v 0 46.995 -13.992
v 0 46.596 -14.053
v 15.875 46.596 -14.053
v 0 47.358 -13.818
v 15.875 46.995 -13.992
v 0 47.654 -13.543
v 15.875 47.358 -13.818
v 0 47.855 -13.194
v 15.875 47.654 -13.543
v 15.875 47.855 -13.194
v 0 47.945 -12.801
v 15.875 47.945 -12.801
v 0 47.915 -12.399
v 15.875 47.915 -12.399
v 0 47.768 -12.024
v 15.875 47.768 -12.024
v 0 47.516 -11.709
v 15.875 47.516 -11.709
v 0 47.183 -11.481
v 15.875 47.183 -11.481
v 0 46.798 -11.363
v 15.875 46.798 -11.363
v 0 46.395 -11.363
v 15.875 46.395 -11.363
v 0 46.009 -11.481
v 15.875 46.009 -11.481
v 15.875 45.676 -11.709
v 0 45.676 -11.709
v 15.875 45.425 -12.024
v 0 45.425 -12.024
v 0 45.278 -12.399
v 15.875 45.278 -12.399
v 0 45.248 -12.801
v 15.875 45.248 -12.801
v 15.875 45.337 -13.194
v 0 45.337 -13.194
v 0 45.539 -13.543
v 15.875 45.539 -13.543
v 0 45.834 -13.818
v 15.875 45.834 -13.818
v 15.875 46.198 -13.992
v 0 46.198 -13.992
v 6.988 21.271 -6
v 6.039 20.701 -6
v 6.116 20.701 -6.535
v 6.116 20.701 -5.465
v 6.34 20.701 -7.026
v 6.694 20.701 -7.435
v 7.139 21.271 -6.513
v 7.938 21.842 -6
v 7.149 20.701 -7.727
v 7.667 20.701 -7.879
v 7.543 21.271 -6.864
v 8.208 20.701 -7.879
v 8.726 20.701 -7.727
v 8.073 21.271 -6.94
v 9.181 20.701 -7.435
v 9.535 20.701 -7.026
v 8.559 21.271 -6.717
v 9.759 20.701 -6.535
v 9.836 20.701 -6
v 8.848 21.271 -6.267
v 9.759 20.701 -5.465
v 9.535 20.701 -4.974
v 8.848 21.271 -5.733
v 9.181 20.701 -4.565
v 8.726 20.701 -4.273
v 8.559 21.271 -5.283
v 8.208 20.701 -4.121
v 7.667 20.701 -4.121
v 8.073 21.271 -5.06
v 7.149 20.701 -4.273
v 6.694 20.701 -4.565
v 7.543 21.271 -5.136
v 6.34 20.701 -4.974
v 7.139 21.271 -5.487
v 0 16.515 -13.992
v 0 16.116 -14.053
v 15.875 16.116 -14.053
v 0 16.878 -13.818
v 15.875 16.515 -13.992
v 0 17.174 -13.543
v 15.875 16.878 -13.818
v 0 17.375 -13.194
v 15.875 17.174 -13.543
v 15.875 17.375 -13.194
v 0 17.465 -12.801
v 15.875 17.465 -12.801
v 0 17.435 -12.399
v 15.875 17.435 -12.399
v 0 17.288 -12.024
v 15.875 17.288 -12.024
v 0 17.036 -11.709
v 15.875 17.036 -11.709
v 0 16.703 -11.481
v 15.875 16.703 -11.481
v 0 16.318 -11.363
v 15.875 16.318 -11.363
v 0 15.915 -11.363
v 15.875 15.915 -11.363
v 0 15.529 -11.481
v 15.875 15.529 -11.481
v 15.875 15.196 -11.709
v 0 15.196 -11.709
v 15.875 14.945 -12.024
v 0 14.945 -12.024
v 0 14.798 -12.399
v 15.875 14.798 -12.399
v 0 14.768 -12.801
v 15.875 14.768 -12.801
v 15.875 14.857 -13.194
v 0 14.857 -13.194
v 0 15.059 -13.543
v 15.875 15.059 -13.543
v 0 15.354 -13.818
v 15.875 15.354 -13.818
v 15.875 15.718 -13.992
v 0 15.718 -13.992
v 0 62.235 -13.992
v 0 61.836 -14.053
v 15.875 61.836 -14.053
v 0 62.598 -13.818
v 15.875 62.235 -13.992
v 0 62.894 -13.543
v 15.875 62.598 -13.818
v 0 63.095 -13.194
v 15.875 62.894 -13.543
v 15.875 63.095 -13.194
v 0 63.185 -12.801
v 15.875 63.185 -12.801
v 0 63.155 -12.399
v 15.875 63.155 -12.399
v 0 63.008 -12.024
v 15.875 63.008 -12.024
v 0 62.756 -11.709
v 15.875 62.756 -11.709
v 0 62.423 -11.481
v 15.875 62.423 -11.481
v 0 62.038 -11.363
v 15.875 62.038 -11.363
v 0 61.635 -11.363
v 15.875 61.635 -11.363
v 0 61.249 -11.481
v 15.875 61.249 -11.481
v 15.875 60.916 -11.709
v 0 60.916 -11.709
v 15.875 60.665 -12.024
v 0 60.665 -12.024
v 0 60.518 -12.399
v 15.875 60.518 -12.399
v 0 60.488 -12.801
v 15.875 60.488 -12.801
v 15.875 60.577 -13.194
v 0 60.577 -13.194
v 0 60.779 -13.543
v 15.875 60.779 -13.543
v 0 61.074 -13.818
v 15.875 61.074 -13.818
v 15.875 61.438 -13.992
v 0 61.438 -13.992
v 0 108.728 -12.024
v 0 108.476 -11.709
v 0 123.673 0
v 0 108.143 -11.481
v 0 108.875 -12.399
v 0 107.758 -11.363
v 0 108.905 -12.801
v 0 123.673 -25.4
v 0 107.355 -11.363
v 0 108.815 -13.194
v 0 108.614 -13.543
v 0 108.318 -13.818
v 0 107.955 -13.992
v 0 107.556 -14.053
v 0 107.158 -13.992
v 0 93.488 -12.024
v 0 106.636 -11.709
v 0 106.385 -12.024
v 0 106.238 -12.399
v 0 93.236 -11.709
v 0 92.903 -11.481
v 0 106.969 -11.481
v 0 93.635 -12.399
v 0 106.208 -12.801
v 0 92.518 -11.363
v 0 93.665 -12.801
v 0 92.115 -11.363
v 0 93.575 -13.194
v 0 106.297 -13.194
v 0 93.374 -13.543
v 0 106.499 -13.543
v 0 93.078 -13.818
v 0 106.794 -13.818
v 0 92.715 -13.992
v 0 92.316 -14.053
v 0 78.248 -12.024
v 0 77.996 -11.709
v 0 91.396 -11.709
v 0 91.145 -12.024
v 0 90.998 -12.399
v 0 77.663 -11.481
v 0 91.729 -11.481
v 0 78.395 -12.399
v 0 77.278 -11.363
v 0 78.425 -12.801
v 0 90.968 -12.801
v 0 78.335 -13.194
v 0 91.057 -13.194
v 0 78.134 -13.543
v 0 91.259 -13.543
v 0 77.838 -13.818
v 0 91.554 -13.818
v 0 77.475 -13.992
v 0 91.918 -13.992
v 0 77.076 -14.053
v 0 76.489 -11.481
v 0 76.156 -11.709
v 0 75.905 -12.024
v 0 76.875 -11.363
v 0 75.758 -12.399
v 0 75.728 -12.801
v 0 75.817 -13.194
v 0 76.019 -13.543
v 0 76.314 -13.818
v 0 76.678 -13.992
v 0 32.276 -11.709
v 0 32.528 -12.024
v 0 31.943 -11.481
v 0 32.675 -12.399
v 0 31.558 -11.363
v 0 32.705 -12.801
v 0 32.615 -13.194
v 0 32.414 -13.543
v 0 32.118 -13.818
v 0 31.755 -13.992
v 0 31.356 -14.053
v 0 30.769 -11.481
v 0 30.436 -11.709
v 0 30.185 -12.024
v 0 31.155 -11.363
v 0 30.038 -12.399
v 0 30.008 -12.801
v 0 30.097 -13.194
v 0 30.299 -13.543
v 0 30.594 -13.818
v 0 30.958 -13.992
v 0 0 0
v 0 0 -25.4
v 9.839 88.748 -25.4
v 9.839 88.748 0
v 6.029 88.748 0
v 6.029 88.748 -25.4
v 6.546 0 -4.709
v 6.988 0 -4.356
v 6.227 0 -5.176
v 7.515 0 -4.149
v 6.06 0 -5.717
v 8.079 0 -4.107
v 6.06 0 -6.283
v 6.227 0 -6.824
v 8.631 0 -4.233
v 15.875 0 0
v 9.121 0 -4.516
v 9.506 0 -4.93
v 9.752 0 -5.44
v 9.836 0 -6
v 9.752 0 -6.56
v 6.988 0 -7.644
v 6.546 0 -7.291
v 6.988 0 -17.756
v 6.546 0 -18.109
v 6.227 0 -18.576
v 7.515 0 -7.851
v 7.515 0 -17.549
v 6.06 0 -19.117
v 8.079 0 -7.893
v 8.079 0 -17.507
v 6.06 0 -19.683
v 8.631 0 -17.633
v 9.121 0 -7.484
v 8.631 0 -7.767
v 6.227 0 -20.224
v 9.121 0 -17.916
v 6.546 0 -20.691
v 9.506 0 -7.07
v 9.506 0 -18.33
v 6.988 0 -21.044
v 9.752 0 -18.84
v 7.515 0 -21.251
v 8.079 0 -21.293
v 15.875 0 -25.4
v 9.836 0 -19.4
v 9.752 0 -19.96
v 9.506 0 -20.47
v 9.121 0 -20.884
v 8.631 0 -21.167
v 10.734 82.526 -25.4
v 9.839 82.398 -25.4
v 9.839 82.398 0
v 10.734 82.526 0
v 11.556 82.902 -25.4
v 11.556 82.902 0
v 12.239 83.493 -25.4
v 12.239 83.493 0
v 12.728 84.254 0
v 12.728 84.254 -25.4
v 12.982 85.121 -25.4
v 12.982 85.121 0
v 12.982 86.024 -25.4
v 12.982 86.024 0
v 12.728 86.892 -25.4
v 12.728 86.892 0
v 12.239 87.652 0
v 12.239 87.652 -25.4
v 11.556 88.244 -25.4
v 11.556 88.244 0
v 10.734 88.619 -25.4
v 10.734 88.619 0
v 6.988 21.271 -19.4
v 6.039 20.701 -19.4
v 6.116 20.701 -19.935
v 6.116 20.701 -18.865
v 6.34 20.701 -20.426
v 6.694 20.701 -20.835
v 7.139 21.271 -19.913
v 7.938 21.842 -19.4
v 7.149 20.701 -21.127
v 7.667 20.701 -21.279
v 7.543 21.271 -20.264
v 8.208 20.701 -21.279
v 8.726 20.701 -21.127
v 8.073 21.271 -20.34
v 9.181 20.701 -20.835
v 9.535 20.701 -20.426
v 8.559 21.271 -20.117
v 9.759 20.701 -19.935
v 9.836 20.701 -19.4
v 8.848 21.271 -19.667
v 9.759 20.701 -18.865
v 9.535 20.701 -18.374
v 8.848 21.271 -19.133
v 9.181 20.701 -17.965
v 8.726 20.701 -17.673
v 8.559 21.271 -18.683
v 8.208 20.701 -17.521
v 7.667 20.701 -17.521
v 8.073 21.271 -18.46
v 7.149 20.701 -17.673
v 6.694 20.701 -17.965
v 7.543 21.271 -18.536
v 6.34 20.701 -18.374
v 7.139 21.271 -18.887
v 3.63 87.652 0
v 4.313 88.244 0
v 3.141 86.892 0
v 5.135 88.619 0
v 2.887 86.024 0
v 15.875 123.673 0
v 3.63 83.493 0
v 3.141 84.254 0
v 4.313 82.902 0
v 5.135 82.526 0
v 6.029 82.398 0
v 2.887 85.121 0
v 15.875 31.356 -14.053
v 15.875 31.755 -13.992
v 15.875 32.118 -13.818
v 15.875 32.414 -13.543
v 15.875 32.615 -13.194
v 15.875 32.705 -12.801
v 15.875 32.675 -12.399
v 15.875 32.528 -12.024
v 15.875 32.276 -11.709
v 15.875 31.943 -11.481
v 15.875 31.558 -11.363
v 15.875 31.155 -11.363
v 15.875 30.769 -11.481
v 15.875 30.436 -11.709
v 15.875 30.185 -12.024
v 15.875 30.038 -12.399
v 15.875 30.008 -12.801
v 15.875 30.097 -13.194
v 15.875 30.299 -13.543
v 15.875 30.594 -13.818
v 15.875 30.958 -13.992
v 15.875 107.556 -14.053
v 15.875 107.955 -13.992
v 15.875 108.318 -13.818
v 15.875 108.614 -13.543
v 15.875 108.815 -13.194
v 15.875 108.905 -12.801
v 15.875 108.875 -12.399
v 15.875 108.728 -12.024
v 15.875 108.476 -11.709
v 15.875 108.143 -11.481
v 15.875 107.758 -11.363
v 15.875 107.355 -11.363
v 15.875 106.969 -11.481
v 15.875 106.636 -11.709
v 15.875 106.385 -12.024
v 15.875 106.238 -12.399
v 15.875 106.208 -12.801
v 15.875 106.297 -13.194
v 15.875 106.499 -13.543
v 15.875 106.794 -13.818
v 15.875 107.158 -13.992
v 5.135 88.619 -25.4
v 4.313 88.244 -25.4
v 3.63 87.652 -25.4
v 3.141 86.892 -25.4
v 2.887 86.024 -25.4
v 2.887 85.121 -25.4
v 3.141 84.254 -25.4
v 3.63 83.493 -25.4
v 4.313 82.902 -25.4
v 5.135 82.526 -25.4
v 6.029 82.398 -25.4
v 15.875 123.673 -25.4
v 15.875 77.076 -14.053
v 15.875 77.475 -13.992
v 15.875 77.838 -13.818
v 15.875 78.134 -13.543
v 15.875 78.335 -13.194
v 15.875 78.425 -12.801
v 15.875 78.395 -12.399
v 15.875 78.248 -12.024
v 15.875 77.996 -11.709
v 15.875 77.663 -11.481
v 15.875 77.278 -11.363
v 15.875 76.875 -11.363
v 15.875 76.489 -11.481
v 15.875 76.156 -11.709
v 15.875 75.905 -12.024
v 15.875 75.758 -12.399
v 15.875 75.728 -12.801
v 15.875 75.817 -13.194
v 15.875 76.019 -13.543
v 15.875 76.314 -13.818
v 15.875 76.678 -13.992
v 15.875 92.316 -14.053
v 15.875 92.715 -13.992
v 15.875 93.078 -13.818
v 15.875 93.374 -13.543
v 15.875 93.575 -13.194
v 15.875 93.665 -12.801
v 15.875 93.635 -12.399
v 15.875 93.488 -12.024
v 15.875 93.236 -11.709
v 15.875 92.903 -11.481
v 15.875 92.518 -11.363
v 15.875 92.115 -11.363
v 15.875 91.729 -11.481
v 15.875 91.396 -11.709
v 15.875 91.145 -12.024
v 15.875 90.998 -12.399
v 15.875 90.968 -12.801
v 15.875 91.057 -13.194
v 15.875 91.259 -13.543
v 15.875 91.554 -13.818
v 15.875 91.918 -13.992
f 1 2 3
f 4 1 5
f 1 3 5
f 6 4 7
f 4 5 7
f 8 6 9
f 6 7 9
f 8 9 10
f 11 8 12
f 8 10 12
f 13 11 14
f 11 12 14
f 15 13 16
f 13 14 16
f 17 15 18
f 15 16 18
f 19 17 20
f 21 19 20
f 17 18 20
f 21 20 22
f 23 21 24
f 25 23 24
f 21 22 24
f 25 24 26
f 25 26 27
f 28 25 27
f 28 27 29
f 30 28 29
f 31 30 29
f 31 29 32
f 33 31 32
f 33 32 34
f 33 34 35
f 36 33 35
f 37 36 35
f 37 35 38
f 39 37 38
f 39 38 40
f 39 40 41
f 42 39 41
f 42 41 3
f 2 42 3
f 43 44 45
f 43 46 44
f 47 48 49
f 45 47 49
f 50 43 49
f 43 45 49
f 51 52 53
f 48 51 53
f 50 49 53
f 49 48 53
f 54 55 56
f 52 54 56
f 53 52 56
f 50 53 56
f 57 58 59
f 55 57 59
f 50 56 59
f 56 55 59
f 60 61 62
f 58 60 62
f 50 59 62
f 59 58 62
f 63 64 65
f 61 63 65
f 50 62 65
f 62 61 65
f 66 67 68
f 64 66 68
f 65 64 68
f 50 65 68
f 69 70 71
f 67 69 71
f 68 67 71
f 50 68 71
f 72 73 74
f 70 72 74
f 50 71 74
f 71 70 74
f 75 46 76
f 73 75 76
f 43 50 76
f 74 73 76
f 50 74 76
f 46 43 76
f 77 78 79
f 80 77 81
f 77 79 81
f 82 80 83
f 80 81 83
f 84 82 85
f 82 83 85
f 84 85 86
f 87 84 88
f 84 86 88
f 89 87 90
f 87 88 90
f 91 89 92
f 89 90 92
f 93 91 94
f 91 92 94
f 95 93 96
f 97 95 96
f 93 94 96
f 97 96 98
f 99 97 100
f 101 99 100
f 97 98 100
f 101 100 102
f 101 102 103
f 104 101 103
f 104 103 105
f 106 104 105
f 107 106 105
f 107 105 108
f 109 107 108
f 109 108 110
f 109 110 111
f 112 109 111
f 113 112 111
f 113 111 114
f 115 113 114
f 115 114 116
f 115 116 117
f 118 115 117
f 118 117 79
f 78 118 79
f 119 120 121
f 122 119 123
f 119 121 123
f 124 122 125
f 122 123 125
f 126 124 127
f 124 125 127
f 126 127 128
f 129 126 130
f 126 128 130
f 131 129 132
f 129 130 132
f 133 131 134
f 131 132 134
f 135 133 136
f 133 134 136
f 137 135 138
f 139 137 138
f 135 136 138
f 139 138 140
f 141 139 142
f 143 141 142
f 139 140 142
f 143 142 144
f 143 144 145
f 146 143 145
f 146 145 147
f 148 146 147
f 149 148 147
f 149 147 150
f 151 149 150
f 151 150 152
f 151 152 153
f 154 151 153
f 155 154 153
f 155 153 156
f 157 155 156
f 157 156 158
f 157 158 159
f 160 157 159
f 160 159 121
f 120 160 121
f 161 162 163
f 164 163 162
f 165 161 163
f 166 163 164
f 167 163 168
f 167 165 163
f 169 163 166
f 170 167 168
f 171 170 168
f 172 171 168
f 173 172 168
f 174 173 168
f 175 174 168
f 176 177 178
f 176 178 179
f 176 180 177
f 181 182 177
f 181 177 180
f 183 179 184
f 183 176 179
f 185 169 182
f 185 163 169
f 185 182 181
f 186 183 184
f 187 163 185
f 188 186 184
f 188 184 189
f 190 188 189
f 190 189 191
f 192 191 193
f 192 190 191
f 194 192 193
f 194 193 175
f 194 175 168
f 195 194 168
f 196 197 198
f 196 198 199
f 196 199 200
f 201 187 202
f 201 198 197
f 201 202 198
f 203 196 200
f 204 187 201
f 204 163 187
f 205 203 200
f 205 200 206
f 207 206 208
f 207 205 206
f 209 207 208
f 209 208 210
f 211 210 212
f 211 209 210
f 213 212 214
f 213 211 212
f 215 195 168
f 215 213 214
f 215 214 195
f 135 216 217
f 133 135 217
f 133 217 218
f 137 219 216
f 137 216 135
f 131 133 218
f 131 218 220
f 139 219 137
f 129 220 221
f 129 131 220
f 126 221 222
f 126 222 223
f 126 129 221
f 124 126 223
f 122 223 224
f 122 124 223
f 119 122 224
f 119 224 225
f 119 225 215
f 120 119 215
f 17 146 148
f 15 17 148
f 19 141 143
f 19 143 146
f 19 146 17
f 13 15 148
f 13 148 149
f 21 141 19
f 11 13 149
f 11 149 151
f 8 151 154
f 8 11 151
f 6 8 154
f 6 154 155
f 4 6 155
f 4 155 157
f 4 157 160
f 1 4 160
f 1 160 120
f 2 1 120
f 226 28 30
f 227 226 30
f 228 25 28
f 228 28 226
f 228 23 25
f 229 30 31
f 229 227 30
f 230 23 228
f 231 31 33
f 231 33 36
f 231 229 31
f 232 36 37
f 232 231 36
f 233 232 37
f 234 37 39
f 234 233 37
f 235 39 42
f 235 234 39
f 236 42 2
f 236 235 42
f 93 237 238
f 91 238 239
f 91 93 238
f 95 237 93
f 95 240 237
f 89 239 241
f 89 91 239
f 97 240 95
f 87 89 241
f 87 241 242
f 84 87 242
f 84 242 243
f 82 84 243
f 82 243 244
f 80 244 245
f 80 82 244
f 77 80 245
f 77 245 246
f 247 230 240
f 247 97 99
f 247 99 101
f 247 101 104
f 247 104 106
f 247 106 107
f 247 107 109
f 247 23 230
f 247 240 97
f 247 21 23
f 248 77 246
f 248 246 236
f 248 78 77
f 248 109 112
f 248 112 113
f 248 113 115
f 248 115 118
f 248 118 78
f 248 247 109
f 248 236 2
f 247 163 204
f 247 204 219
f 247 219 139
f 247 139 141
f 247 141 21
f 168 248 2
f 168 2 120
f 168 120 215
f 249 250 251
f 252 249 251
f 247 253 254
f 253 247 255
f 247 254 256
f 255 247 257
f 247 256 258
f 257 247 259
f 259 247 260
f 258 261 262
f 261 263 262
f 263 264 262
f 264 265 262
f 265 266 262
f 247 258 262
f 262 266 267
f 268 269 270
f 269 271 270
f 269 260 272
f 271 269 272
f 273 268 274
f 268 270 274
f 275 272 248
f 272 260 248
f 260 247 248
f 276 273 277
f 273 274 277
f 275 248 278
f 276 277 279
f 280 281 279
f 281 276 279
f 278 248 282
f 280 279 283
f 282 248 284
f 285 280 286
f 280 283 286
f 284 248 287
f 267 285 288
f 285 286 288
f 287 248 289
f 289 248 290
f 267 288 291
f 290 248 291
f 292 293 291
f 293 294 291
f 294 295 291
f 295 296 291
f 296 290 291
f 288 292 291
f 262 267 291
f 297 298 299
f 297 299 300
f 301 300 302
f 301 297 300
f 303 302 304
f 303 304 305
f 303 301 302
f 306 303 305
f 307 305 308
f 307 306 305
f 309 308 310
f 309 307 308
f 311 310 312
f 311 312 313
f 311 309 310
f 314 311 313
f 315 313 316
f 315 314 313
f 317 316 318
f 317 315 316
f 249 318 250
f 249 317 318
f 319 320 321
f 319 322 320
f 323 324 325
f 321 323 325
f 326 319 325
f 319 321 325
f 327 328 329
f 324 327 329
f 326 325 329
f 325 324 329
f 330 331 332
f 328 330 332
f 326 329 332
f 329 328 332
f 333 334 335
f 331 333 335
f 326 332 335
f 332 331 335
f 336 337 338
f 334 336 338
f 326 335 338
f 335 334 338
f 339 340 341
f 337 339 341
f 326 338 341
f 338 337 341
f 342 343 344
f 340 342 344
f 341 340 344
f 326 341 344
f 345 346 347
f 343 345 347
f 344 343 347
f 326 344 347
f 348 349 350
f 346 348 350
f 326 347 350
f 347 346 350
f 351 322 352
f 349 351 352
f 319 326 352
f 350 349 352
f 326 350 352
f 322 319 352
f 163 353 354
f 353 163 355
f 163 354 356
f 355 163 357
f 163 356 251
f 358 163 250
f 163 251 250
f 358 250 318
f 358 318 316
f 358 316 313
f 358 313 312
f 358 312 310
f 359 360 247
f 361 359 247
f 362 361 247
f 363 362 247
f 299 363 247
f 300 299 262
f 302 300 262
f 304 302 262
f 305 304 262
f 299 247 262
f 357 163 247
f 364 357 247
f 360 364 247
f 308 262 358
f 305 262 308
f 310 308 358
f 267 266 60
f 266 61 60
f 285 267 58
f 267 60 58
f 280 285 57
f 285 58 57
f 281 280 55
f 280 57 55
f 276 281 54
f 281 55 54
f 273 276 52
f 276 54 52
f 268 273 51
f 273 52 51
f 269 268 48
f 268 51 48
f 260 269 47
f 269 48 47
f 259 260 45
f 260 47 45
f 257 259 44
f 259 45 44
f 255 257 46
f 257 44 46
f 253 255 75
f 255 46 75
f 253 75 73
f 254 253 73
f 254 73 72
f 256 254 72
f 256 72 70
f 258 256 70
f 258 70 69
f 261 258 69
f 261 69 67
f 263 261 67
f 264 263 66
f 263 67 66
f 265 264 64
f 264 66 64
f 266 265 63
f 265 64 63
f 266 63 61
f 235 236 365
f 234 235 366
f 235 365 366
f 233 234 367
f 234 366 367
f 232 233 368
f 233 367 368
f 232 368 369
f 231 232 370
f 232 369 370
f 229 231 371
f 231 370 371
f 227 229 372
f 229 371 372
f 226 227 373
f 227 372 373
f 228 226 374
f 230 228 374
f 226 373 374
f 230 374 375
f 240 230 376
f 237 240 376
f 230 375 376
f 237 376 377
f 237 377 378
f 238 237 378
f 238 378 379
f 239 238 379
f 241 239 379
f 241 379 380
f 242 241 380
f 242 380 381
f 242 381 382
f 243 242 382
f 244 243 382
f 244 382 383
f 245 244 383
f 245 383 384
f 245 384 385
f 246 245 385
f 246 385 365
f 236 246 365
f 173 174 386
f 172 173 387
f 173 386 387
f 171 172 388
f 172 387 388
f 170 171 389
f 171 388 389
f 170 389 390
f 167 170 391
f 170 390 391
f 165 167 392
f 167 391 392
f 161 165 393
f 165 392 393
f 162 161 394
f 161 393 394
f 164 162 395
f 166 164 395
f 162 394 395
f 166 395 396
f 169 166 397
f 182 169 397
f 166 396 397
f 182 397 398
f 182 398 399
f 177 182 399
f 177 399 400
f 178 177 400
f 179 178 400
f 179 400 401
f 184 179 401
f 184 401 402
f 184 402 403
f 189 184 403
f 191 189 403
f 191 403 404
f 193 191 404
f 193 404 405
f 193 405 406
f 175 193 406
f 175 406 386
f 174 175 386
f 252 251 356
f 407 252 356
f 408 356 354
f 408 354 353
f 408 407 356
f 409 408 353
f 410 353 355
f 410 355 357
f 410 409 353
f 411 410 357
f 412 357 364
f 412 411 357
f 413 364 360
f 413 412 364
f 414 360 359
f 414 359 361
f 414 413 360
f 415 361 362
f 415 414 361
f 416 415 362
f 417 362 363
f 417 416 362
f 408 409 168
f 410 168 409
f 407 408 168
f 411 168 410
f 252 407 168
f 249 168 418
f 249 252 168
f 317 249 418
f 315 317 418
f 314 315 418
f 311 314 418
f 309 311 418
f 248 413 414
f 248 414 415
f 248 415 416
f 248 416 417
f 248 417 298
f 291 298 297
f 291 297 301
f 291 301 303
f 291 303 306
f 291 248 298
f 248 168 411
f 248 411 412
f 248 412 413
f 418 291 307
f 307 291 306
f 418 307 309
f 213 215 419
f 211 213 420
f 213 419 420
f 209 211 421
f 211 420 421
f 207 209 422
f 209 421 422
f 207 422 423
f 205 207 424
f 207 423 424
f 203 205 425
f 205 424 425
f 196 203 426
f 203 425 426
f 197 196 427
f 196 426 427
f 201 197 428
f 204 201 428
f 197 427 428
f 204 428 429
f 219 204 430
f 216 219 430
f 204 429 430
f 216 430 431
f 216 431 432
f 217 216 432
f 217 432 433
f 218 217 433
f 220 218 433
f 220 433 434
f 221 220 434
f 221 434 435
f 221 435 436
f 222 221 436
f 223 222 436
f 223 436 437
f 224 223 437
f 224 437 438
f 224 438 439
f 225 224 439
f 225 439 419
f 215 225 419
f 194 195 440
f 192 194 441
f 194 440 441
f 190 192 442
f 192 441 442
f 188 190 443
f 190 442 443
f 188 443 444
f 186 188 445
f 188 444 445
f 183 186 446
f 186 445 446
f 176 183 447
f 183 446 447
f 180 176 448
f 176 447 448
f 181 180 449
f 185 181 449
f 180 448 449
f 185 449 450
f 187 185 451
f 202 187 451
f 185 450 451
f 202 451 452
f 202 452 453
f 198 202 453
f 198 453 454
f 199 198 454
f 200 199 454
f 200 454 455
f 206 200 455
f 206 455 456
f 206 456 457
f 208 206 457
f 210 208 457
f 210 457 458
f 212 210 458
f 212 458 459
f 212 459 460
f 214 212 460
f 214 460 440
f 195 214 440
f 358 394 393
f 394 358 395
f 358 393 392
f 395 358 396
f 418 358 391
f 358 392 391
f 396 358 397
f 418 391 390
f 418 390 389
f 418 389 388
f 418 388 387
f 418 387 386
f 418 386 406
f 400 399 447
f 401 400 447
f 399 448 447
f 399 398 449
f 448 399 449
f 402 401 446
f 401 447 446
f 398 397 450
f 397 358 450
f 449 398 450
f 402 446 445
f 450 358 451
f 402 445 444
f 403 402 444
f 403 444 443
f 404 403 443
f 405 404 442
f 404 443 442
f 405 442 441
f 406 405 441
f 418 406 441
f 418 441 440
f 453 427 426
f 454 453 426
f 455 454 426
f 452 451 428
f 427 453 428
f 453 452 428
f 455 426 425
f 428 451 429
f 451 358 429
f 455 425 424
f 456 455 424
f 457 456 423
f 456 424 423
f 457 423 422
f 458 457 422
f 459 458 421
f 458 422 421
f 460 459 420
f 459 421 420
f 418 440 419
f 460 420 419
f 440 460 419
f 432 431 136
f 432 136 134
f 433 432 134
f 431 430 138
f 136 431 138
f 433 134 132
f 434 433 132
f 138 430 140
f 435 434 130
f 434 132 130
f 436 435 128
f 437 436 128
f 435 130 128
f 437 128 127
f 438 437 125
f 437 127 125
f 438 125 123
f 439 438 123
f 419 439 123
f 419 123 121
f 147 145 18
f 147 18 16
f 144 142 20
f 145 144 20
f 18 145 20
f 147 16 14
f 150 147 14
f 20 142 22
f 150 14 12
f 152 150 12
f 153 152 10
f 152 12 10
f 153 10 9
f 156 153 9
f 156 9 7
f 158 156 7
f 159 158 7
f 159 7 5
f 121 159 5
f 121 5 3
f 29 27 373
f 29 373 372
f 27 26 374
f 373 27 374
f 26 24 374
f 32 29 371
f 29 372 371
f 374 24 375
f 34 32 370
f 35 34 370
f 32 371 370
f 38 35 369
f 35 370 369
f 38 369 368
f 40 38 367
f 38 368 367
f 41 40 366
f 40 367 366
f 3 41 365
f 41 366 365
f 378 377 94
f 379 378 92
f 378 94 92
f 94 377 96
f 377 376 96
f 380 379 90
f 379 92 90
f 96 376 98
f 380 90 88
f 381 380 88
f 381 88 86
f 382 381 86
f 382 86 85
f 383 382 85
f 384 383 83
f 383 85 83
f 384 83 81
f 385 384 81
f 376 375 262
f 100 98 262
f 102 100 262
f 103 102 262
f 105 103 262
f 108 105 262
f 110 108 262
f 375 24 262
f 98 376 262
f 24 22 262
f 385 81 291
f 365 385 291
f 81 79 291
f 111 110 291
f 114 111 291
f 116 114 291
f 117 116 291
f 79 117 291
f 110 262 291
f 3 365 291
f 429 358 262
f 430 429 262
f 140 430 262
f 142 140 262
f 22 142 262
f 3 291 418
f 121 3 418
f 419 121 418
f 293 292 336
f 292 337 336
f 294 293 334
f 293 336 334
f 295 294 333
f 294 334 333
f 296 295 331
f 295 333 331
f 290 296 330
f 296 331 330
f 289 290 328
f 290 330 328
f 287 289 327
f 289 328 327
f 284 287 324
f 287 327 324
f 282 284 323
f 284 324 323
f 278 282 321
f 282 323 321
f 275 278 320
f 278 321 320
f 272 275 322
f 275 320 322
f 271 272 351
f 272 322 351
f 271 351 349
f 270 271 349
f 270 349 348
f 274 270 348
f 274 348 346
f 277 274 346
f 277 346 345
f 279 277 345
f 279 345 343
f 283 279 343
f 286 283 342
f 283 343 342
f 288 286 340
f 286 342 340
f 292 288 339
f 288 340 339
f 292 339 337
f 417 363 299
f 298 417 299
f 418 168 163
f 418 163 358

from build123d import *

# Parameters (mm, degrees)
SKETCH1_W                           = 15.875
SKETCH1_H                           = 25.4
BOSS_EXTRUDE1_DEPTH                 = 123.6726
TAP_DRILL_FOR_10_24_TAP1_D          = 3.7973
TAP_DRILL_FOR_10_24_TAP1_DEPTH      = 20.701
TAP_DRILL_FOR_10_24_TAP1_TIP        = 1.140824014
TAP_DRILL_FOR_6_32_TAP1_D           = 2.7051
TAP_START                           = -25.4
TAP_DRILL_SLOT_FOR_10_24_TAP1_DEPTH = 25.4
TAP_DRILL_SLOT_FOR_10_24_TAP2_D     = 6.35


# Read off the part's stored shape, not the designer's step: Tap Drill Slot for #10-24 Tap1
with BuildPart() as part:
    # Sketch1 → Boss-Extrude1 (new body)
    with BuildSketch(Plane(origin=(0, 0, 0), x_dir=(1, 0, 0), z_dir=(0, 1, 0))):
        with Locations((7.9375, 12.7)):
            Rectangle(SKETCH1_W, SKETCH1_H)
    extrude(amount=BOSS_EXTRUDE1_DEPTH)

    # Tap Drill for #10-24 Tap1
    with Locations(Plane(origin=(0, 0, 0), x_dir=(-1, 0, 0), z_dir=(0, -1, 0))):
        with Locations((-7.9375, 6), (-7.9375, 19.4)):
            Hole(TAP_DRILL_FOR_10_24_TAP1_D / 2, depth=TAP_DRILL_FOR_10_24_TAP1_DEPTH)
            with Locations((0, 0, -(TAP_DRILL_FOR_10_24_TAP1_DEPTH + TAP_DRILL_FOR_10_24_TAP1_TIP / 2))):  # 118° drill point
                Cone(0, TAP_DRILL_FOR_10_24_TAP1_D / 2, TAP_DRILL_FOR_10_24_TAP1_TIP, mode=Mode.SUBTRACT)

    # Tap Drill for #6-32 Tap1 (through all)
    with Locations(Plane.ZY):
        with Locations((-12.7, 61.8363), (-12.7, 77.0763), (-12.7, 92.3163), (-12.7, 46.5963), (-12.7, 31.3563), (-12.7, 107.5563), (-12.7, 16.1163)):
            Hole(TAP_DRILL_FOR_6_32_TAP1_D / 2)

    # Tap Drill Slot for #10-24 Tap1 outline → Tap Drill Slot for #10-24 Tap1 (cut)
    with BuildSketch(Plane.XY.offset(TAP_START)):
        with BuildLine():
            Line((6.029499774, 82.3976), (9.839499774, 82.3976))
            ThreePointArc((9.839499774, 82.3976), (13.014499774, 85.5726), (9.839499774, 88.7476))
            Line((9.839499774, 88.7476), (6.029499774, 88.7476))
            ThreePointArc((6.029499774, 88.7476), (2.854499774, 85.5726), (6.029499774, 82.3976))
        make_face()
    extrude(amount=TAP_DRILL_SLOT_FOR_10_24_TAP1_DEPTH, mode=Mode.SUBTRACT)

    # Tap Drill Slot for #10-24 Tap2 (through all)
    with Locations(Plane(origin=(-765.990733255, -1637.545835602, 0), x_dir=(1, 0, 0), z_dir=(0, 0, 1))):
        with Locations((773.925233029, 1723.118435602)):
            Hole(TAP_DRILL_SLOT_FOR_10_24_TAP2_D / 2)


solid = part.part
